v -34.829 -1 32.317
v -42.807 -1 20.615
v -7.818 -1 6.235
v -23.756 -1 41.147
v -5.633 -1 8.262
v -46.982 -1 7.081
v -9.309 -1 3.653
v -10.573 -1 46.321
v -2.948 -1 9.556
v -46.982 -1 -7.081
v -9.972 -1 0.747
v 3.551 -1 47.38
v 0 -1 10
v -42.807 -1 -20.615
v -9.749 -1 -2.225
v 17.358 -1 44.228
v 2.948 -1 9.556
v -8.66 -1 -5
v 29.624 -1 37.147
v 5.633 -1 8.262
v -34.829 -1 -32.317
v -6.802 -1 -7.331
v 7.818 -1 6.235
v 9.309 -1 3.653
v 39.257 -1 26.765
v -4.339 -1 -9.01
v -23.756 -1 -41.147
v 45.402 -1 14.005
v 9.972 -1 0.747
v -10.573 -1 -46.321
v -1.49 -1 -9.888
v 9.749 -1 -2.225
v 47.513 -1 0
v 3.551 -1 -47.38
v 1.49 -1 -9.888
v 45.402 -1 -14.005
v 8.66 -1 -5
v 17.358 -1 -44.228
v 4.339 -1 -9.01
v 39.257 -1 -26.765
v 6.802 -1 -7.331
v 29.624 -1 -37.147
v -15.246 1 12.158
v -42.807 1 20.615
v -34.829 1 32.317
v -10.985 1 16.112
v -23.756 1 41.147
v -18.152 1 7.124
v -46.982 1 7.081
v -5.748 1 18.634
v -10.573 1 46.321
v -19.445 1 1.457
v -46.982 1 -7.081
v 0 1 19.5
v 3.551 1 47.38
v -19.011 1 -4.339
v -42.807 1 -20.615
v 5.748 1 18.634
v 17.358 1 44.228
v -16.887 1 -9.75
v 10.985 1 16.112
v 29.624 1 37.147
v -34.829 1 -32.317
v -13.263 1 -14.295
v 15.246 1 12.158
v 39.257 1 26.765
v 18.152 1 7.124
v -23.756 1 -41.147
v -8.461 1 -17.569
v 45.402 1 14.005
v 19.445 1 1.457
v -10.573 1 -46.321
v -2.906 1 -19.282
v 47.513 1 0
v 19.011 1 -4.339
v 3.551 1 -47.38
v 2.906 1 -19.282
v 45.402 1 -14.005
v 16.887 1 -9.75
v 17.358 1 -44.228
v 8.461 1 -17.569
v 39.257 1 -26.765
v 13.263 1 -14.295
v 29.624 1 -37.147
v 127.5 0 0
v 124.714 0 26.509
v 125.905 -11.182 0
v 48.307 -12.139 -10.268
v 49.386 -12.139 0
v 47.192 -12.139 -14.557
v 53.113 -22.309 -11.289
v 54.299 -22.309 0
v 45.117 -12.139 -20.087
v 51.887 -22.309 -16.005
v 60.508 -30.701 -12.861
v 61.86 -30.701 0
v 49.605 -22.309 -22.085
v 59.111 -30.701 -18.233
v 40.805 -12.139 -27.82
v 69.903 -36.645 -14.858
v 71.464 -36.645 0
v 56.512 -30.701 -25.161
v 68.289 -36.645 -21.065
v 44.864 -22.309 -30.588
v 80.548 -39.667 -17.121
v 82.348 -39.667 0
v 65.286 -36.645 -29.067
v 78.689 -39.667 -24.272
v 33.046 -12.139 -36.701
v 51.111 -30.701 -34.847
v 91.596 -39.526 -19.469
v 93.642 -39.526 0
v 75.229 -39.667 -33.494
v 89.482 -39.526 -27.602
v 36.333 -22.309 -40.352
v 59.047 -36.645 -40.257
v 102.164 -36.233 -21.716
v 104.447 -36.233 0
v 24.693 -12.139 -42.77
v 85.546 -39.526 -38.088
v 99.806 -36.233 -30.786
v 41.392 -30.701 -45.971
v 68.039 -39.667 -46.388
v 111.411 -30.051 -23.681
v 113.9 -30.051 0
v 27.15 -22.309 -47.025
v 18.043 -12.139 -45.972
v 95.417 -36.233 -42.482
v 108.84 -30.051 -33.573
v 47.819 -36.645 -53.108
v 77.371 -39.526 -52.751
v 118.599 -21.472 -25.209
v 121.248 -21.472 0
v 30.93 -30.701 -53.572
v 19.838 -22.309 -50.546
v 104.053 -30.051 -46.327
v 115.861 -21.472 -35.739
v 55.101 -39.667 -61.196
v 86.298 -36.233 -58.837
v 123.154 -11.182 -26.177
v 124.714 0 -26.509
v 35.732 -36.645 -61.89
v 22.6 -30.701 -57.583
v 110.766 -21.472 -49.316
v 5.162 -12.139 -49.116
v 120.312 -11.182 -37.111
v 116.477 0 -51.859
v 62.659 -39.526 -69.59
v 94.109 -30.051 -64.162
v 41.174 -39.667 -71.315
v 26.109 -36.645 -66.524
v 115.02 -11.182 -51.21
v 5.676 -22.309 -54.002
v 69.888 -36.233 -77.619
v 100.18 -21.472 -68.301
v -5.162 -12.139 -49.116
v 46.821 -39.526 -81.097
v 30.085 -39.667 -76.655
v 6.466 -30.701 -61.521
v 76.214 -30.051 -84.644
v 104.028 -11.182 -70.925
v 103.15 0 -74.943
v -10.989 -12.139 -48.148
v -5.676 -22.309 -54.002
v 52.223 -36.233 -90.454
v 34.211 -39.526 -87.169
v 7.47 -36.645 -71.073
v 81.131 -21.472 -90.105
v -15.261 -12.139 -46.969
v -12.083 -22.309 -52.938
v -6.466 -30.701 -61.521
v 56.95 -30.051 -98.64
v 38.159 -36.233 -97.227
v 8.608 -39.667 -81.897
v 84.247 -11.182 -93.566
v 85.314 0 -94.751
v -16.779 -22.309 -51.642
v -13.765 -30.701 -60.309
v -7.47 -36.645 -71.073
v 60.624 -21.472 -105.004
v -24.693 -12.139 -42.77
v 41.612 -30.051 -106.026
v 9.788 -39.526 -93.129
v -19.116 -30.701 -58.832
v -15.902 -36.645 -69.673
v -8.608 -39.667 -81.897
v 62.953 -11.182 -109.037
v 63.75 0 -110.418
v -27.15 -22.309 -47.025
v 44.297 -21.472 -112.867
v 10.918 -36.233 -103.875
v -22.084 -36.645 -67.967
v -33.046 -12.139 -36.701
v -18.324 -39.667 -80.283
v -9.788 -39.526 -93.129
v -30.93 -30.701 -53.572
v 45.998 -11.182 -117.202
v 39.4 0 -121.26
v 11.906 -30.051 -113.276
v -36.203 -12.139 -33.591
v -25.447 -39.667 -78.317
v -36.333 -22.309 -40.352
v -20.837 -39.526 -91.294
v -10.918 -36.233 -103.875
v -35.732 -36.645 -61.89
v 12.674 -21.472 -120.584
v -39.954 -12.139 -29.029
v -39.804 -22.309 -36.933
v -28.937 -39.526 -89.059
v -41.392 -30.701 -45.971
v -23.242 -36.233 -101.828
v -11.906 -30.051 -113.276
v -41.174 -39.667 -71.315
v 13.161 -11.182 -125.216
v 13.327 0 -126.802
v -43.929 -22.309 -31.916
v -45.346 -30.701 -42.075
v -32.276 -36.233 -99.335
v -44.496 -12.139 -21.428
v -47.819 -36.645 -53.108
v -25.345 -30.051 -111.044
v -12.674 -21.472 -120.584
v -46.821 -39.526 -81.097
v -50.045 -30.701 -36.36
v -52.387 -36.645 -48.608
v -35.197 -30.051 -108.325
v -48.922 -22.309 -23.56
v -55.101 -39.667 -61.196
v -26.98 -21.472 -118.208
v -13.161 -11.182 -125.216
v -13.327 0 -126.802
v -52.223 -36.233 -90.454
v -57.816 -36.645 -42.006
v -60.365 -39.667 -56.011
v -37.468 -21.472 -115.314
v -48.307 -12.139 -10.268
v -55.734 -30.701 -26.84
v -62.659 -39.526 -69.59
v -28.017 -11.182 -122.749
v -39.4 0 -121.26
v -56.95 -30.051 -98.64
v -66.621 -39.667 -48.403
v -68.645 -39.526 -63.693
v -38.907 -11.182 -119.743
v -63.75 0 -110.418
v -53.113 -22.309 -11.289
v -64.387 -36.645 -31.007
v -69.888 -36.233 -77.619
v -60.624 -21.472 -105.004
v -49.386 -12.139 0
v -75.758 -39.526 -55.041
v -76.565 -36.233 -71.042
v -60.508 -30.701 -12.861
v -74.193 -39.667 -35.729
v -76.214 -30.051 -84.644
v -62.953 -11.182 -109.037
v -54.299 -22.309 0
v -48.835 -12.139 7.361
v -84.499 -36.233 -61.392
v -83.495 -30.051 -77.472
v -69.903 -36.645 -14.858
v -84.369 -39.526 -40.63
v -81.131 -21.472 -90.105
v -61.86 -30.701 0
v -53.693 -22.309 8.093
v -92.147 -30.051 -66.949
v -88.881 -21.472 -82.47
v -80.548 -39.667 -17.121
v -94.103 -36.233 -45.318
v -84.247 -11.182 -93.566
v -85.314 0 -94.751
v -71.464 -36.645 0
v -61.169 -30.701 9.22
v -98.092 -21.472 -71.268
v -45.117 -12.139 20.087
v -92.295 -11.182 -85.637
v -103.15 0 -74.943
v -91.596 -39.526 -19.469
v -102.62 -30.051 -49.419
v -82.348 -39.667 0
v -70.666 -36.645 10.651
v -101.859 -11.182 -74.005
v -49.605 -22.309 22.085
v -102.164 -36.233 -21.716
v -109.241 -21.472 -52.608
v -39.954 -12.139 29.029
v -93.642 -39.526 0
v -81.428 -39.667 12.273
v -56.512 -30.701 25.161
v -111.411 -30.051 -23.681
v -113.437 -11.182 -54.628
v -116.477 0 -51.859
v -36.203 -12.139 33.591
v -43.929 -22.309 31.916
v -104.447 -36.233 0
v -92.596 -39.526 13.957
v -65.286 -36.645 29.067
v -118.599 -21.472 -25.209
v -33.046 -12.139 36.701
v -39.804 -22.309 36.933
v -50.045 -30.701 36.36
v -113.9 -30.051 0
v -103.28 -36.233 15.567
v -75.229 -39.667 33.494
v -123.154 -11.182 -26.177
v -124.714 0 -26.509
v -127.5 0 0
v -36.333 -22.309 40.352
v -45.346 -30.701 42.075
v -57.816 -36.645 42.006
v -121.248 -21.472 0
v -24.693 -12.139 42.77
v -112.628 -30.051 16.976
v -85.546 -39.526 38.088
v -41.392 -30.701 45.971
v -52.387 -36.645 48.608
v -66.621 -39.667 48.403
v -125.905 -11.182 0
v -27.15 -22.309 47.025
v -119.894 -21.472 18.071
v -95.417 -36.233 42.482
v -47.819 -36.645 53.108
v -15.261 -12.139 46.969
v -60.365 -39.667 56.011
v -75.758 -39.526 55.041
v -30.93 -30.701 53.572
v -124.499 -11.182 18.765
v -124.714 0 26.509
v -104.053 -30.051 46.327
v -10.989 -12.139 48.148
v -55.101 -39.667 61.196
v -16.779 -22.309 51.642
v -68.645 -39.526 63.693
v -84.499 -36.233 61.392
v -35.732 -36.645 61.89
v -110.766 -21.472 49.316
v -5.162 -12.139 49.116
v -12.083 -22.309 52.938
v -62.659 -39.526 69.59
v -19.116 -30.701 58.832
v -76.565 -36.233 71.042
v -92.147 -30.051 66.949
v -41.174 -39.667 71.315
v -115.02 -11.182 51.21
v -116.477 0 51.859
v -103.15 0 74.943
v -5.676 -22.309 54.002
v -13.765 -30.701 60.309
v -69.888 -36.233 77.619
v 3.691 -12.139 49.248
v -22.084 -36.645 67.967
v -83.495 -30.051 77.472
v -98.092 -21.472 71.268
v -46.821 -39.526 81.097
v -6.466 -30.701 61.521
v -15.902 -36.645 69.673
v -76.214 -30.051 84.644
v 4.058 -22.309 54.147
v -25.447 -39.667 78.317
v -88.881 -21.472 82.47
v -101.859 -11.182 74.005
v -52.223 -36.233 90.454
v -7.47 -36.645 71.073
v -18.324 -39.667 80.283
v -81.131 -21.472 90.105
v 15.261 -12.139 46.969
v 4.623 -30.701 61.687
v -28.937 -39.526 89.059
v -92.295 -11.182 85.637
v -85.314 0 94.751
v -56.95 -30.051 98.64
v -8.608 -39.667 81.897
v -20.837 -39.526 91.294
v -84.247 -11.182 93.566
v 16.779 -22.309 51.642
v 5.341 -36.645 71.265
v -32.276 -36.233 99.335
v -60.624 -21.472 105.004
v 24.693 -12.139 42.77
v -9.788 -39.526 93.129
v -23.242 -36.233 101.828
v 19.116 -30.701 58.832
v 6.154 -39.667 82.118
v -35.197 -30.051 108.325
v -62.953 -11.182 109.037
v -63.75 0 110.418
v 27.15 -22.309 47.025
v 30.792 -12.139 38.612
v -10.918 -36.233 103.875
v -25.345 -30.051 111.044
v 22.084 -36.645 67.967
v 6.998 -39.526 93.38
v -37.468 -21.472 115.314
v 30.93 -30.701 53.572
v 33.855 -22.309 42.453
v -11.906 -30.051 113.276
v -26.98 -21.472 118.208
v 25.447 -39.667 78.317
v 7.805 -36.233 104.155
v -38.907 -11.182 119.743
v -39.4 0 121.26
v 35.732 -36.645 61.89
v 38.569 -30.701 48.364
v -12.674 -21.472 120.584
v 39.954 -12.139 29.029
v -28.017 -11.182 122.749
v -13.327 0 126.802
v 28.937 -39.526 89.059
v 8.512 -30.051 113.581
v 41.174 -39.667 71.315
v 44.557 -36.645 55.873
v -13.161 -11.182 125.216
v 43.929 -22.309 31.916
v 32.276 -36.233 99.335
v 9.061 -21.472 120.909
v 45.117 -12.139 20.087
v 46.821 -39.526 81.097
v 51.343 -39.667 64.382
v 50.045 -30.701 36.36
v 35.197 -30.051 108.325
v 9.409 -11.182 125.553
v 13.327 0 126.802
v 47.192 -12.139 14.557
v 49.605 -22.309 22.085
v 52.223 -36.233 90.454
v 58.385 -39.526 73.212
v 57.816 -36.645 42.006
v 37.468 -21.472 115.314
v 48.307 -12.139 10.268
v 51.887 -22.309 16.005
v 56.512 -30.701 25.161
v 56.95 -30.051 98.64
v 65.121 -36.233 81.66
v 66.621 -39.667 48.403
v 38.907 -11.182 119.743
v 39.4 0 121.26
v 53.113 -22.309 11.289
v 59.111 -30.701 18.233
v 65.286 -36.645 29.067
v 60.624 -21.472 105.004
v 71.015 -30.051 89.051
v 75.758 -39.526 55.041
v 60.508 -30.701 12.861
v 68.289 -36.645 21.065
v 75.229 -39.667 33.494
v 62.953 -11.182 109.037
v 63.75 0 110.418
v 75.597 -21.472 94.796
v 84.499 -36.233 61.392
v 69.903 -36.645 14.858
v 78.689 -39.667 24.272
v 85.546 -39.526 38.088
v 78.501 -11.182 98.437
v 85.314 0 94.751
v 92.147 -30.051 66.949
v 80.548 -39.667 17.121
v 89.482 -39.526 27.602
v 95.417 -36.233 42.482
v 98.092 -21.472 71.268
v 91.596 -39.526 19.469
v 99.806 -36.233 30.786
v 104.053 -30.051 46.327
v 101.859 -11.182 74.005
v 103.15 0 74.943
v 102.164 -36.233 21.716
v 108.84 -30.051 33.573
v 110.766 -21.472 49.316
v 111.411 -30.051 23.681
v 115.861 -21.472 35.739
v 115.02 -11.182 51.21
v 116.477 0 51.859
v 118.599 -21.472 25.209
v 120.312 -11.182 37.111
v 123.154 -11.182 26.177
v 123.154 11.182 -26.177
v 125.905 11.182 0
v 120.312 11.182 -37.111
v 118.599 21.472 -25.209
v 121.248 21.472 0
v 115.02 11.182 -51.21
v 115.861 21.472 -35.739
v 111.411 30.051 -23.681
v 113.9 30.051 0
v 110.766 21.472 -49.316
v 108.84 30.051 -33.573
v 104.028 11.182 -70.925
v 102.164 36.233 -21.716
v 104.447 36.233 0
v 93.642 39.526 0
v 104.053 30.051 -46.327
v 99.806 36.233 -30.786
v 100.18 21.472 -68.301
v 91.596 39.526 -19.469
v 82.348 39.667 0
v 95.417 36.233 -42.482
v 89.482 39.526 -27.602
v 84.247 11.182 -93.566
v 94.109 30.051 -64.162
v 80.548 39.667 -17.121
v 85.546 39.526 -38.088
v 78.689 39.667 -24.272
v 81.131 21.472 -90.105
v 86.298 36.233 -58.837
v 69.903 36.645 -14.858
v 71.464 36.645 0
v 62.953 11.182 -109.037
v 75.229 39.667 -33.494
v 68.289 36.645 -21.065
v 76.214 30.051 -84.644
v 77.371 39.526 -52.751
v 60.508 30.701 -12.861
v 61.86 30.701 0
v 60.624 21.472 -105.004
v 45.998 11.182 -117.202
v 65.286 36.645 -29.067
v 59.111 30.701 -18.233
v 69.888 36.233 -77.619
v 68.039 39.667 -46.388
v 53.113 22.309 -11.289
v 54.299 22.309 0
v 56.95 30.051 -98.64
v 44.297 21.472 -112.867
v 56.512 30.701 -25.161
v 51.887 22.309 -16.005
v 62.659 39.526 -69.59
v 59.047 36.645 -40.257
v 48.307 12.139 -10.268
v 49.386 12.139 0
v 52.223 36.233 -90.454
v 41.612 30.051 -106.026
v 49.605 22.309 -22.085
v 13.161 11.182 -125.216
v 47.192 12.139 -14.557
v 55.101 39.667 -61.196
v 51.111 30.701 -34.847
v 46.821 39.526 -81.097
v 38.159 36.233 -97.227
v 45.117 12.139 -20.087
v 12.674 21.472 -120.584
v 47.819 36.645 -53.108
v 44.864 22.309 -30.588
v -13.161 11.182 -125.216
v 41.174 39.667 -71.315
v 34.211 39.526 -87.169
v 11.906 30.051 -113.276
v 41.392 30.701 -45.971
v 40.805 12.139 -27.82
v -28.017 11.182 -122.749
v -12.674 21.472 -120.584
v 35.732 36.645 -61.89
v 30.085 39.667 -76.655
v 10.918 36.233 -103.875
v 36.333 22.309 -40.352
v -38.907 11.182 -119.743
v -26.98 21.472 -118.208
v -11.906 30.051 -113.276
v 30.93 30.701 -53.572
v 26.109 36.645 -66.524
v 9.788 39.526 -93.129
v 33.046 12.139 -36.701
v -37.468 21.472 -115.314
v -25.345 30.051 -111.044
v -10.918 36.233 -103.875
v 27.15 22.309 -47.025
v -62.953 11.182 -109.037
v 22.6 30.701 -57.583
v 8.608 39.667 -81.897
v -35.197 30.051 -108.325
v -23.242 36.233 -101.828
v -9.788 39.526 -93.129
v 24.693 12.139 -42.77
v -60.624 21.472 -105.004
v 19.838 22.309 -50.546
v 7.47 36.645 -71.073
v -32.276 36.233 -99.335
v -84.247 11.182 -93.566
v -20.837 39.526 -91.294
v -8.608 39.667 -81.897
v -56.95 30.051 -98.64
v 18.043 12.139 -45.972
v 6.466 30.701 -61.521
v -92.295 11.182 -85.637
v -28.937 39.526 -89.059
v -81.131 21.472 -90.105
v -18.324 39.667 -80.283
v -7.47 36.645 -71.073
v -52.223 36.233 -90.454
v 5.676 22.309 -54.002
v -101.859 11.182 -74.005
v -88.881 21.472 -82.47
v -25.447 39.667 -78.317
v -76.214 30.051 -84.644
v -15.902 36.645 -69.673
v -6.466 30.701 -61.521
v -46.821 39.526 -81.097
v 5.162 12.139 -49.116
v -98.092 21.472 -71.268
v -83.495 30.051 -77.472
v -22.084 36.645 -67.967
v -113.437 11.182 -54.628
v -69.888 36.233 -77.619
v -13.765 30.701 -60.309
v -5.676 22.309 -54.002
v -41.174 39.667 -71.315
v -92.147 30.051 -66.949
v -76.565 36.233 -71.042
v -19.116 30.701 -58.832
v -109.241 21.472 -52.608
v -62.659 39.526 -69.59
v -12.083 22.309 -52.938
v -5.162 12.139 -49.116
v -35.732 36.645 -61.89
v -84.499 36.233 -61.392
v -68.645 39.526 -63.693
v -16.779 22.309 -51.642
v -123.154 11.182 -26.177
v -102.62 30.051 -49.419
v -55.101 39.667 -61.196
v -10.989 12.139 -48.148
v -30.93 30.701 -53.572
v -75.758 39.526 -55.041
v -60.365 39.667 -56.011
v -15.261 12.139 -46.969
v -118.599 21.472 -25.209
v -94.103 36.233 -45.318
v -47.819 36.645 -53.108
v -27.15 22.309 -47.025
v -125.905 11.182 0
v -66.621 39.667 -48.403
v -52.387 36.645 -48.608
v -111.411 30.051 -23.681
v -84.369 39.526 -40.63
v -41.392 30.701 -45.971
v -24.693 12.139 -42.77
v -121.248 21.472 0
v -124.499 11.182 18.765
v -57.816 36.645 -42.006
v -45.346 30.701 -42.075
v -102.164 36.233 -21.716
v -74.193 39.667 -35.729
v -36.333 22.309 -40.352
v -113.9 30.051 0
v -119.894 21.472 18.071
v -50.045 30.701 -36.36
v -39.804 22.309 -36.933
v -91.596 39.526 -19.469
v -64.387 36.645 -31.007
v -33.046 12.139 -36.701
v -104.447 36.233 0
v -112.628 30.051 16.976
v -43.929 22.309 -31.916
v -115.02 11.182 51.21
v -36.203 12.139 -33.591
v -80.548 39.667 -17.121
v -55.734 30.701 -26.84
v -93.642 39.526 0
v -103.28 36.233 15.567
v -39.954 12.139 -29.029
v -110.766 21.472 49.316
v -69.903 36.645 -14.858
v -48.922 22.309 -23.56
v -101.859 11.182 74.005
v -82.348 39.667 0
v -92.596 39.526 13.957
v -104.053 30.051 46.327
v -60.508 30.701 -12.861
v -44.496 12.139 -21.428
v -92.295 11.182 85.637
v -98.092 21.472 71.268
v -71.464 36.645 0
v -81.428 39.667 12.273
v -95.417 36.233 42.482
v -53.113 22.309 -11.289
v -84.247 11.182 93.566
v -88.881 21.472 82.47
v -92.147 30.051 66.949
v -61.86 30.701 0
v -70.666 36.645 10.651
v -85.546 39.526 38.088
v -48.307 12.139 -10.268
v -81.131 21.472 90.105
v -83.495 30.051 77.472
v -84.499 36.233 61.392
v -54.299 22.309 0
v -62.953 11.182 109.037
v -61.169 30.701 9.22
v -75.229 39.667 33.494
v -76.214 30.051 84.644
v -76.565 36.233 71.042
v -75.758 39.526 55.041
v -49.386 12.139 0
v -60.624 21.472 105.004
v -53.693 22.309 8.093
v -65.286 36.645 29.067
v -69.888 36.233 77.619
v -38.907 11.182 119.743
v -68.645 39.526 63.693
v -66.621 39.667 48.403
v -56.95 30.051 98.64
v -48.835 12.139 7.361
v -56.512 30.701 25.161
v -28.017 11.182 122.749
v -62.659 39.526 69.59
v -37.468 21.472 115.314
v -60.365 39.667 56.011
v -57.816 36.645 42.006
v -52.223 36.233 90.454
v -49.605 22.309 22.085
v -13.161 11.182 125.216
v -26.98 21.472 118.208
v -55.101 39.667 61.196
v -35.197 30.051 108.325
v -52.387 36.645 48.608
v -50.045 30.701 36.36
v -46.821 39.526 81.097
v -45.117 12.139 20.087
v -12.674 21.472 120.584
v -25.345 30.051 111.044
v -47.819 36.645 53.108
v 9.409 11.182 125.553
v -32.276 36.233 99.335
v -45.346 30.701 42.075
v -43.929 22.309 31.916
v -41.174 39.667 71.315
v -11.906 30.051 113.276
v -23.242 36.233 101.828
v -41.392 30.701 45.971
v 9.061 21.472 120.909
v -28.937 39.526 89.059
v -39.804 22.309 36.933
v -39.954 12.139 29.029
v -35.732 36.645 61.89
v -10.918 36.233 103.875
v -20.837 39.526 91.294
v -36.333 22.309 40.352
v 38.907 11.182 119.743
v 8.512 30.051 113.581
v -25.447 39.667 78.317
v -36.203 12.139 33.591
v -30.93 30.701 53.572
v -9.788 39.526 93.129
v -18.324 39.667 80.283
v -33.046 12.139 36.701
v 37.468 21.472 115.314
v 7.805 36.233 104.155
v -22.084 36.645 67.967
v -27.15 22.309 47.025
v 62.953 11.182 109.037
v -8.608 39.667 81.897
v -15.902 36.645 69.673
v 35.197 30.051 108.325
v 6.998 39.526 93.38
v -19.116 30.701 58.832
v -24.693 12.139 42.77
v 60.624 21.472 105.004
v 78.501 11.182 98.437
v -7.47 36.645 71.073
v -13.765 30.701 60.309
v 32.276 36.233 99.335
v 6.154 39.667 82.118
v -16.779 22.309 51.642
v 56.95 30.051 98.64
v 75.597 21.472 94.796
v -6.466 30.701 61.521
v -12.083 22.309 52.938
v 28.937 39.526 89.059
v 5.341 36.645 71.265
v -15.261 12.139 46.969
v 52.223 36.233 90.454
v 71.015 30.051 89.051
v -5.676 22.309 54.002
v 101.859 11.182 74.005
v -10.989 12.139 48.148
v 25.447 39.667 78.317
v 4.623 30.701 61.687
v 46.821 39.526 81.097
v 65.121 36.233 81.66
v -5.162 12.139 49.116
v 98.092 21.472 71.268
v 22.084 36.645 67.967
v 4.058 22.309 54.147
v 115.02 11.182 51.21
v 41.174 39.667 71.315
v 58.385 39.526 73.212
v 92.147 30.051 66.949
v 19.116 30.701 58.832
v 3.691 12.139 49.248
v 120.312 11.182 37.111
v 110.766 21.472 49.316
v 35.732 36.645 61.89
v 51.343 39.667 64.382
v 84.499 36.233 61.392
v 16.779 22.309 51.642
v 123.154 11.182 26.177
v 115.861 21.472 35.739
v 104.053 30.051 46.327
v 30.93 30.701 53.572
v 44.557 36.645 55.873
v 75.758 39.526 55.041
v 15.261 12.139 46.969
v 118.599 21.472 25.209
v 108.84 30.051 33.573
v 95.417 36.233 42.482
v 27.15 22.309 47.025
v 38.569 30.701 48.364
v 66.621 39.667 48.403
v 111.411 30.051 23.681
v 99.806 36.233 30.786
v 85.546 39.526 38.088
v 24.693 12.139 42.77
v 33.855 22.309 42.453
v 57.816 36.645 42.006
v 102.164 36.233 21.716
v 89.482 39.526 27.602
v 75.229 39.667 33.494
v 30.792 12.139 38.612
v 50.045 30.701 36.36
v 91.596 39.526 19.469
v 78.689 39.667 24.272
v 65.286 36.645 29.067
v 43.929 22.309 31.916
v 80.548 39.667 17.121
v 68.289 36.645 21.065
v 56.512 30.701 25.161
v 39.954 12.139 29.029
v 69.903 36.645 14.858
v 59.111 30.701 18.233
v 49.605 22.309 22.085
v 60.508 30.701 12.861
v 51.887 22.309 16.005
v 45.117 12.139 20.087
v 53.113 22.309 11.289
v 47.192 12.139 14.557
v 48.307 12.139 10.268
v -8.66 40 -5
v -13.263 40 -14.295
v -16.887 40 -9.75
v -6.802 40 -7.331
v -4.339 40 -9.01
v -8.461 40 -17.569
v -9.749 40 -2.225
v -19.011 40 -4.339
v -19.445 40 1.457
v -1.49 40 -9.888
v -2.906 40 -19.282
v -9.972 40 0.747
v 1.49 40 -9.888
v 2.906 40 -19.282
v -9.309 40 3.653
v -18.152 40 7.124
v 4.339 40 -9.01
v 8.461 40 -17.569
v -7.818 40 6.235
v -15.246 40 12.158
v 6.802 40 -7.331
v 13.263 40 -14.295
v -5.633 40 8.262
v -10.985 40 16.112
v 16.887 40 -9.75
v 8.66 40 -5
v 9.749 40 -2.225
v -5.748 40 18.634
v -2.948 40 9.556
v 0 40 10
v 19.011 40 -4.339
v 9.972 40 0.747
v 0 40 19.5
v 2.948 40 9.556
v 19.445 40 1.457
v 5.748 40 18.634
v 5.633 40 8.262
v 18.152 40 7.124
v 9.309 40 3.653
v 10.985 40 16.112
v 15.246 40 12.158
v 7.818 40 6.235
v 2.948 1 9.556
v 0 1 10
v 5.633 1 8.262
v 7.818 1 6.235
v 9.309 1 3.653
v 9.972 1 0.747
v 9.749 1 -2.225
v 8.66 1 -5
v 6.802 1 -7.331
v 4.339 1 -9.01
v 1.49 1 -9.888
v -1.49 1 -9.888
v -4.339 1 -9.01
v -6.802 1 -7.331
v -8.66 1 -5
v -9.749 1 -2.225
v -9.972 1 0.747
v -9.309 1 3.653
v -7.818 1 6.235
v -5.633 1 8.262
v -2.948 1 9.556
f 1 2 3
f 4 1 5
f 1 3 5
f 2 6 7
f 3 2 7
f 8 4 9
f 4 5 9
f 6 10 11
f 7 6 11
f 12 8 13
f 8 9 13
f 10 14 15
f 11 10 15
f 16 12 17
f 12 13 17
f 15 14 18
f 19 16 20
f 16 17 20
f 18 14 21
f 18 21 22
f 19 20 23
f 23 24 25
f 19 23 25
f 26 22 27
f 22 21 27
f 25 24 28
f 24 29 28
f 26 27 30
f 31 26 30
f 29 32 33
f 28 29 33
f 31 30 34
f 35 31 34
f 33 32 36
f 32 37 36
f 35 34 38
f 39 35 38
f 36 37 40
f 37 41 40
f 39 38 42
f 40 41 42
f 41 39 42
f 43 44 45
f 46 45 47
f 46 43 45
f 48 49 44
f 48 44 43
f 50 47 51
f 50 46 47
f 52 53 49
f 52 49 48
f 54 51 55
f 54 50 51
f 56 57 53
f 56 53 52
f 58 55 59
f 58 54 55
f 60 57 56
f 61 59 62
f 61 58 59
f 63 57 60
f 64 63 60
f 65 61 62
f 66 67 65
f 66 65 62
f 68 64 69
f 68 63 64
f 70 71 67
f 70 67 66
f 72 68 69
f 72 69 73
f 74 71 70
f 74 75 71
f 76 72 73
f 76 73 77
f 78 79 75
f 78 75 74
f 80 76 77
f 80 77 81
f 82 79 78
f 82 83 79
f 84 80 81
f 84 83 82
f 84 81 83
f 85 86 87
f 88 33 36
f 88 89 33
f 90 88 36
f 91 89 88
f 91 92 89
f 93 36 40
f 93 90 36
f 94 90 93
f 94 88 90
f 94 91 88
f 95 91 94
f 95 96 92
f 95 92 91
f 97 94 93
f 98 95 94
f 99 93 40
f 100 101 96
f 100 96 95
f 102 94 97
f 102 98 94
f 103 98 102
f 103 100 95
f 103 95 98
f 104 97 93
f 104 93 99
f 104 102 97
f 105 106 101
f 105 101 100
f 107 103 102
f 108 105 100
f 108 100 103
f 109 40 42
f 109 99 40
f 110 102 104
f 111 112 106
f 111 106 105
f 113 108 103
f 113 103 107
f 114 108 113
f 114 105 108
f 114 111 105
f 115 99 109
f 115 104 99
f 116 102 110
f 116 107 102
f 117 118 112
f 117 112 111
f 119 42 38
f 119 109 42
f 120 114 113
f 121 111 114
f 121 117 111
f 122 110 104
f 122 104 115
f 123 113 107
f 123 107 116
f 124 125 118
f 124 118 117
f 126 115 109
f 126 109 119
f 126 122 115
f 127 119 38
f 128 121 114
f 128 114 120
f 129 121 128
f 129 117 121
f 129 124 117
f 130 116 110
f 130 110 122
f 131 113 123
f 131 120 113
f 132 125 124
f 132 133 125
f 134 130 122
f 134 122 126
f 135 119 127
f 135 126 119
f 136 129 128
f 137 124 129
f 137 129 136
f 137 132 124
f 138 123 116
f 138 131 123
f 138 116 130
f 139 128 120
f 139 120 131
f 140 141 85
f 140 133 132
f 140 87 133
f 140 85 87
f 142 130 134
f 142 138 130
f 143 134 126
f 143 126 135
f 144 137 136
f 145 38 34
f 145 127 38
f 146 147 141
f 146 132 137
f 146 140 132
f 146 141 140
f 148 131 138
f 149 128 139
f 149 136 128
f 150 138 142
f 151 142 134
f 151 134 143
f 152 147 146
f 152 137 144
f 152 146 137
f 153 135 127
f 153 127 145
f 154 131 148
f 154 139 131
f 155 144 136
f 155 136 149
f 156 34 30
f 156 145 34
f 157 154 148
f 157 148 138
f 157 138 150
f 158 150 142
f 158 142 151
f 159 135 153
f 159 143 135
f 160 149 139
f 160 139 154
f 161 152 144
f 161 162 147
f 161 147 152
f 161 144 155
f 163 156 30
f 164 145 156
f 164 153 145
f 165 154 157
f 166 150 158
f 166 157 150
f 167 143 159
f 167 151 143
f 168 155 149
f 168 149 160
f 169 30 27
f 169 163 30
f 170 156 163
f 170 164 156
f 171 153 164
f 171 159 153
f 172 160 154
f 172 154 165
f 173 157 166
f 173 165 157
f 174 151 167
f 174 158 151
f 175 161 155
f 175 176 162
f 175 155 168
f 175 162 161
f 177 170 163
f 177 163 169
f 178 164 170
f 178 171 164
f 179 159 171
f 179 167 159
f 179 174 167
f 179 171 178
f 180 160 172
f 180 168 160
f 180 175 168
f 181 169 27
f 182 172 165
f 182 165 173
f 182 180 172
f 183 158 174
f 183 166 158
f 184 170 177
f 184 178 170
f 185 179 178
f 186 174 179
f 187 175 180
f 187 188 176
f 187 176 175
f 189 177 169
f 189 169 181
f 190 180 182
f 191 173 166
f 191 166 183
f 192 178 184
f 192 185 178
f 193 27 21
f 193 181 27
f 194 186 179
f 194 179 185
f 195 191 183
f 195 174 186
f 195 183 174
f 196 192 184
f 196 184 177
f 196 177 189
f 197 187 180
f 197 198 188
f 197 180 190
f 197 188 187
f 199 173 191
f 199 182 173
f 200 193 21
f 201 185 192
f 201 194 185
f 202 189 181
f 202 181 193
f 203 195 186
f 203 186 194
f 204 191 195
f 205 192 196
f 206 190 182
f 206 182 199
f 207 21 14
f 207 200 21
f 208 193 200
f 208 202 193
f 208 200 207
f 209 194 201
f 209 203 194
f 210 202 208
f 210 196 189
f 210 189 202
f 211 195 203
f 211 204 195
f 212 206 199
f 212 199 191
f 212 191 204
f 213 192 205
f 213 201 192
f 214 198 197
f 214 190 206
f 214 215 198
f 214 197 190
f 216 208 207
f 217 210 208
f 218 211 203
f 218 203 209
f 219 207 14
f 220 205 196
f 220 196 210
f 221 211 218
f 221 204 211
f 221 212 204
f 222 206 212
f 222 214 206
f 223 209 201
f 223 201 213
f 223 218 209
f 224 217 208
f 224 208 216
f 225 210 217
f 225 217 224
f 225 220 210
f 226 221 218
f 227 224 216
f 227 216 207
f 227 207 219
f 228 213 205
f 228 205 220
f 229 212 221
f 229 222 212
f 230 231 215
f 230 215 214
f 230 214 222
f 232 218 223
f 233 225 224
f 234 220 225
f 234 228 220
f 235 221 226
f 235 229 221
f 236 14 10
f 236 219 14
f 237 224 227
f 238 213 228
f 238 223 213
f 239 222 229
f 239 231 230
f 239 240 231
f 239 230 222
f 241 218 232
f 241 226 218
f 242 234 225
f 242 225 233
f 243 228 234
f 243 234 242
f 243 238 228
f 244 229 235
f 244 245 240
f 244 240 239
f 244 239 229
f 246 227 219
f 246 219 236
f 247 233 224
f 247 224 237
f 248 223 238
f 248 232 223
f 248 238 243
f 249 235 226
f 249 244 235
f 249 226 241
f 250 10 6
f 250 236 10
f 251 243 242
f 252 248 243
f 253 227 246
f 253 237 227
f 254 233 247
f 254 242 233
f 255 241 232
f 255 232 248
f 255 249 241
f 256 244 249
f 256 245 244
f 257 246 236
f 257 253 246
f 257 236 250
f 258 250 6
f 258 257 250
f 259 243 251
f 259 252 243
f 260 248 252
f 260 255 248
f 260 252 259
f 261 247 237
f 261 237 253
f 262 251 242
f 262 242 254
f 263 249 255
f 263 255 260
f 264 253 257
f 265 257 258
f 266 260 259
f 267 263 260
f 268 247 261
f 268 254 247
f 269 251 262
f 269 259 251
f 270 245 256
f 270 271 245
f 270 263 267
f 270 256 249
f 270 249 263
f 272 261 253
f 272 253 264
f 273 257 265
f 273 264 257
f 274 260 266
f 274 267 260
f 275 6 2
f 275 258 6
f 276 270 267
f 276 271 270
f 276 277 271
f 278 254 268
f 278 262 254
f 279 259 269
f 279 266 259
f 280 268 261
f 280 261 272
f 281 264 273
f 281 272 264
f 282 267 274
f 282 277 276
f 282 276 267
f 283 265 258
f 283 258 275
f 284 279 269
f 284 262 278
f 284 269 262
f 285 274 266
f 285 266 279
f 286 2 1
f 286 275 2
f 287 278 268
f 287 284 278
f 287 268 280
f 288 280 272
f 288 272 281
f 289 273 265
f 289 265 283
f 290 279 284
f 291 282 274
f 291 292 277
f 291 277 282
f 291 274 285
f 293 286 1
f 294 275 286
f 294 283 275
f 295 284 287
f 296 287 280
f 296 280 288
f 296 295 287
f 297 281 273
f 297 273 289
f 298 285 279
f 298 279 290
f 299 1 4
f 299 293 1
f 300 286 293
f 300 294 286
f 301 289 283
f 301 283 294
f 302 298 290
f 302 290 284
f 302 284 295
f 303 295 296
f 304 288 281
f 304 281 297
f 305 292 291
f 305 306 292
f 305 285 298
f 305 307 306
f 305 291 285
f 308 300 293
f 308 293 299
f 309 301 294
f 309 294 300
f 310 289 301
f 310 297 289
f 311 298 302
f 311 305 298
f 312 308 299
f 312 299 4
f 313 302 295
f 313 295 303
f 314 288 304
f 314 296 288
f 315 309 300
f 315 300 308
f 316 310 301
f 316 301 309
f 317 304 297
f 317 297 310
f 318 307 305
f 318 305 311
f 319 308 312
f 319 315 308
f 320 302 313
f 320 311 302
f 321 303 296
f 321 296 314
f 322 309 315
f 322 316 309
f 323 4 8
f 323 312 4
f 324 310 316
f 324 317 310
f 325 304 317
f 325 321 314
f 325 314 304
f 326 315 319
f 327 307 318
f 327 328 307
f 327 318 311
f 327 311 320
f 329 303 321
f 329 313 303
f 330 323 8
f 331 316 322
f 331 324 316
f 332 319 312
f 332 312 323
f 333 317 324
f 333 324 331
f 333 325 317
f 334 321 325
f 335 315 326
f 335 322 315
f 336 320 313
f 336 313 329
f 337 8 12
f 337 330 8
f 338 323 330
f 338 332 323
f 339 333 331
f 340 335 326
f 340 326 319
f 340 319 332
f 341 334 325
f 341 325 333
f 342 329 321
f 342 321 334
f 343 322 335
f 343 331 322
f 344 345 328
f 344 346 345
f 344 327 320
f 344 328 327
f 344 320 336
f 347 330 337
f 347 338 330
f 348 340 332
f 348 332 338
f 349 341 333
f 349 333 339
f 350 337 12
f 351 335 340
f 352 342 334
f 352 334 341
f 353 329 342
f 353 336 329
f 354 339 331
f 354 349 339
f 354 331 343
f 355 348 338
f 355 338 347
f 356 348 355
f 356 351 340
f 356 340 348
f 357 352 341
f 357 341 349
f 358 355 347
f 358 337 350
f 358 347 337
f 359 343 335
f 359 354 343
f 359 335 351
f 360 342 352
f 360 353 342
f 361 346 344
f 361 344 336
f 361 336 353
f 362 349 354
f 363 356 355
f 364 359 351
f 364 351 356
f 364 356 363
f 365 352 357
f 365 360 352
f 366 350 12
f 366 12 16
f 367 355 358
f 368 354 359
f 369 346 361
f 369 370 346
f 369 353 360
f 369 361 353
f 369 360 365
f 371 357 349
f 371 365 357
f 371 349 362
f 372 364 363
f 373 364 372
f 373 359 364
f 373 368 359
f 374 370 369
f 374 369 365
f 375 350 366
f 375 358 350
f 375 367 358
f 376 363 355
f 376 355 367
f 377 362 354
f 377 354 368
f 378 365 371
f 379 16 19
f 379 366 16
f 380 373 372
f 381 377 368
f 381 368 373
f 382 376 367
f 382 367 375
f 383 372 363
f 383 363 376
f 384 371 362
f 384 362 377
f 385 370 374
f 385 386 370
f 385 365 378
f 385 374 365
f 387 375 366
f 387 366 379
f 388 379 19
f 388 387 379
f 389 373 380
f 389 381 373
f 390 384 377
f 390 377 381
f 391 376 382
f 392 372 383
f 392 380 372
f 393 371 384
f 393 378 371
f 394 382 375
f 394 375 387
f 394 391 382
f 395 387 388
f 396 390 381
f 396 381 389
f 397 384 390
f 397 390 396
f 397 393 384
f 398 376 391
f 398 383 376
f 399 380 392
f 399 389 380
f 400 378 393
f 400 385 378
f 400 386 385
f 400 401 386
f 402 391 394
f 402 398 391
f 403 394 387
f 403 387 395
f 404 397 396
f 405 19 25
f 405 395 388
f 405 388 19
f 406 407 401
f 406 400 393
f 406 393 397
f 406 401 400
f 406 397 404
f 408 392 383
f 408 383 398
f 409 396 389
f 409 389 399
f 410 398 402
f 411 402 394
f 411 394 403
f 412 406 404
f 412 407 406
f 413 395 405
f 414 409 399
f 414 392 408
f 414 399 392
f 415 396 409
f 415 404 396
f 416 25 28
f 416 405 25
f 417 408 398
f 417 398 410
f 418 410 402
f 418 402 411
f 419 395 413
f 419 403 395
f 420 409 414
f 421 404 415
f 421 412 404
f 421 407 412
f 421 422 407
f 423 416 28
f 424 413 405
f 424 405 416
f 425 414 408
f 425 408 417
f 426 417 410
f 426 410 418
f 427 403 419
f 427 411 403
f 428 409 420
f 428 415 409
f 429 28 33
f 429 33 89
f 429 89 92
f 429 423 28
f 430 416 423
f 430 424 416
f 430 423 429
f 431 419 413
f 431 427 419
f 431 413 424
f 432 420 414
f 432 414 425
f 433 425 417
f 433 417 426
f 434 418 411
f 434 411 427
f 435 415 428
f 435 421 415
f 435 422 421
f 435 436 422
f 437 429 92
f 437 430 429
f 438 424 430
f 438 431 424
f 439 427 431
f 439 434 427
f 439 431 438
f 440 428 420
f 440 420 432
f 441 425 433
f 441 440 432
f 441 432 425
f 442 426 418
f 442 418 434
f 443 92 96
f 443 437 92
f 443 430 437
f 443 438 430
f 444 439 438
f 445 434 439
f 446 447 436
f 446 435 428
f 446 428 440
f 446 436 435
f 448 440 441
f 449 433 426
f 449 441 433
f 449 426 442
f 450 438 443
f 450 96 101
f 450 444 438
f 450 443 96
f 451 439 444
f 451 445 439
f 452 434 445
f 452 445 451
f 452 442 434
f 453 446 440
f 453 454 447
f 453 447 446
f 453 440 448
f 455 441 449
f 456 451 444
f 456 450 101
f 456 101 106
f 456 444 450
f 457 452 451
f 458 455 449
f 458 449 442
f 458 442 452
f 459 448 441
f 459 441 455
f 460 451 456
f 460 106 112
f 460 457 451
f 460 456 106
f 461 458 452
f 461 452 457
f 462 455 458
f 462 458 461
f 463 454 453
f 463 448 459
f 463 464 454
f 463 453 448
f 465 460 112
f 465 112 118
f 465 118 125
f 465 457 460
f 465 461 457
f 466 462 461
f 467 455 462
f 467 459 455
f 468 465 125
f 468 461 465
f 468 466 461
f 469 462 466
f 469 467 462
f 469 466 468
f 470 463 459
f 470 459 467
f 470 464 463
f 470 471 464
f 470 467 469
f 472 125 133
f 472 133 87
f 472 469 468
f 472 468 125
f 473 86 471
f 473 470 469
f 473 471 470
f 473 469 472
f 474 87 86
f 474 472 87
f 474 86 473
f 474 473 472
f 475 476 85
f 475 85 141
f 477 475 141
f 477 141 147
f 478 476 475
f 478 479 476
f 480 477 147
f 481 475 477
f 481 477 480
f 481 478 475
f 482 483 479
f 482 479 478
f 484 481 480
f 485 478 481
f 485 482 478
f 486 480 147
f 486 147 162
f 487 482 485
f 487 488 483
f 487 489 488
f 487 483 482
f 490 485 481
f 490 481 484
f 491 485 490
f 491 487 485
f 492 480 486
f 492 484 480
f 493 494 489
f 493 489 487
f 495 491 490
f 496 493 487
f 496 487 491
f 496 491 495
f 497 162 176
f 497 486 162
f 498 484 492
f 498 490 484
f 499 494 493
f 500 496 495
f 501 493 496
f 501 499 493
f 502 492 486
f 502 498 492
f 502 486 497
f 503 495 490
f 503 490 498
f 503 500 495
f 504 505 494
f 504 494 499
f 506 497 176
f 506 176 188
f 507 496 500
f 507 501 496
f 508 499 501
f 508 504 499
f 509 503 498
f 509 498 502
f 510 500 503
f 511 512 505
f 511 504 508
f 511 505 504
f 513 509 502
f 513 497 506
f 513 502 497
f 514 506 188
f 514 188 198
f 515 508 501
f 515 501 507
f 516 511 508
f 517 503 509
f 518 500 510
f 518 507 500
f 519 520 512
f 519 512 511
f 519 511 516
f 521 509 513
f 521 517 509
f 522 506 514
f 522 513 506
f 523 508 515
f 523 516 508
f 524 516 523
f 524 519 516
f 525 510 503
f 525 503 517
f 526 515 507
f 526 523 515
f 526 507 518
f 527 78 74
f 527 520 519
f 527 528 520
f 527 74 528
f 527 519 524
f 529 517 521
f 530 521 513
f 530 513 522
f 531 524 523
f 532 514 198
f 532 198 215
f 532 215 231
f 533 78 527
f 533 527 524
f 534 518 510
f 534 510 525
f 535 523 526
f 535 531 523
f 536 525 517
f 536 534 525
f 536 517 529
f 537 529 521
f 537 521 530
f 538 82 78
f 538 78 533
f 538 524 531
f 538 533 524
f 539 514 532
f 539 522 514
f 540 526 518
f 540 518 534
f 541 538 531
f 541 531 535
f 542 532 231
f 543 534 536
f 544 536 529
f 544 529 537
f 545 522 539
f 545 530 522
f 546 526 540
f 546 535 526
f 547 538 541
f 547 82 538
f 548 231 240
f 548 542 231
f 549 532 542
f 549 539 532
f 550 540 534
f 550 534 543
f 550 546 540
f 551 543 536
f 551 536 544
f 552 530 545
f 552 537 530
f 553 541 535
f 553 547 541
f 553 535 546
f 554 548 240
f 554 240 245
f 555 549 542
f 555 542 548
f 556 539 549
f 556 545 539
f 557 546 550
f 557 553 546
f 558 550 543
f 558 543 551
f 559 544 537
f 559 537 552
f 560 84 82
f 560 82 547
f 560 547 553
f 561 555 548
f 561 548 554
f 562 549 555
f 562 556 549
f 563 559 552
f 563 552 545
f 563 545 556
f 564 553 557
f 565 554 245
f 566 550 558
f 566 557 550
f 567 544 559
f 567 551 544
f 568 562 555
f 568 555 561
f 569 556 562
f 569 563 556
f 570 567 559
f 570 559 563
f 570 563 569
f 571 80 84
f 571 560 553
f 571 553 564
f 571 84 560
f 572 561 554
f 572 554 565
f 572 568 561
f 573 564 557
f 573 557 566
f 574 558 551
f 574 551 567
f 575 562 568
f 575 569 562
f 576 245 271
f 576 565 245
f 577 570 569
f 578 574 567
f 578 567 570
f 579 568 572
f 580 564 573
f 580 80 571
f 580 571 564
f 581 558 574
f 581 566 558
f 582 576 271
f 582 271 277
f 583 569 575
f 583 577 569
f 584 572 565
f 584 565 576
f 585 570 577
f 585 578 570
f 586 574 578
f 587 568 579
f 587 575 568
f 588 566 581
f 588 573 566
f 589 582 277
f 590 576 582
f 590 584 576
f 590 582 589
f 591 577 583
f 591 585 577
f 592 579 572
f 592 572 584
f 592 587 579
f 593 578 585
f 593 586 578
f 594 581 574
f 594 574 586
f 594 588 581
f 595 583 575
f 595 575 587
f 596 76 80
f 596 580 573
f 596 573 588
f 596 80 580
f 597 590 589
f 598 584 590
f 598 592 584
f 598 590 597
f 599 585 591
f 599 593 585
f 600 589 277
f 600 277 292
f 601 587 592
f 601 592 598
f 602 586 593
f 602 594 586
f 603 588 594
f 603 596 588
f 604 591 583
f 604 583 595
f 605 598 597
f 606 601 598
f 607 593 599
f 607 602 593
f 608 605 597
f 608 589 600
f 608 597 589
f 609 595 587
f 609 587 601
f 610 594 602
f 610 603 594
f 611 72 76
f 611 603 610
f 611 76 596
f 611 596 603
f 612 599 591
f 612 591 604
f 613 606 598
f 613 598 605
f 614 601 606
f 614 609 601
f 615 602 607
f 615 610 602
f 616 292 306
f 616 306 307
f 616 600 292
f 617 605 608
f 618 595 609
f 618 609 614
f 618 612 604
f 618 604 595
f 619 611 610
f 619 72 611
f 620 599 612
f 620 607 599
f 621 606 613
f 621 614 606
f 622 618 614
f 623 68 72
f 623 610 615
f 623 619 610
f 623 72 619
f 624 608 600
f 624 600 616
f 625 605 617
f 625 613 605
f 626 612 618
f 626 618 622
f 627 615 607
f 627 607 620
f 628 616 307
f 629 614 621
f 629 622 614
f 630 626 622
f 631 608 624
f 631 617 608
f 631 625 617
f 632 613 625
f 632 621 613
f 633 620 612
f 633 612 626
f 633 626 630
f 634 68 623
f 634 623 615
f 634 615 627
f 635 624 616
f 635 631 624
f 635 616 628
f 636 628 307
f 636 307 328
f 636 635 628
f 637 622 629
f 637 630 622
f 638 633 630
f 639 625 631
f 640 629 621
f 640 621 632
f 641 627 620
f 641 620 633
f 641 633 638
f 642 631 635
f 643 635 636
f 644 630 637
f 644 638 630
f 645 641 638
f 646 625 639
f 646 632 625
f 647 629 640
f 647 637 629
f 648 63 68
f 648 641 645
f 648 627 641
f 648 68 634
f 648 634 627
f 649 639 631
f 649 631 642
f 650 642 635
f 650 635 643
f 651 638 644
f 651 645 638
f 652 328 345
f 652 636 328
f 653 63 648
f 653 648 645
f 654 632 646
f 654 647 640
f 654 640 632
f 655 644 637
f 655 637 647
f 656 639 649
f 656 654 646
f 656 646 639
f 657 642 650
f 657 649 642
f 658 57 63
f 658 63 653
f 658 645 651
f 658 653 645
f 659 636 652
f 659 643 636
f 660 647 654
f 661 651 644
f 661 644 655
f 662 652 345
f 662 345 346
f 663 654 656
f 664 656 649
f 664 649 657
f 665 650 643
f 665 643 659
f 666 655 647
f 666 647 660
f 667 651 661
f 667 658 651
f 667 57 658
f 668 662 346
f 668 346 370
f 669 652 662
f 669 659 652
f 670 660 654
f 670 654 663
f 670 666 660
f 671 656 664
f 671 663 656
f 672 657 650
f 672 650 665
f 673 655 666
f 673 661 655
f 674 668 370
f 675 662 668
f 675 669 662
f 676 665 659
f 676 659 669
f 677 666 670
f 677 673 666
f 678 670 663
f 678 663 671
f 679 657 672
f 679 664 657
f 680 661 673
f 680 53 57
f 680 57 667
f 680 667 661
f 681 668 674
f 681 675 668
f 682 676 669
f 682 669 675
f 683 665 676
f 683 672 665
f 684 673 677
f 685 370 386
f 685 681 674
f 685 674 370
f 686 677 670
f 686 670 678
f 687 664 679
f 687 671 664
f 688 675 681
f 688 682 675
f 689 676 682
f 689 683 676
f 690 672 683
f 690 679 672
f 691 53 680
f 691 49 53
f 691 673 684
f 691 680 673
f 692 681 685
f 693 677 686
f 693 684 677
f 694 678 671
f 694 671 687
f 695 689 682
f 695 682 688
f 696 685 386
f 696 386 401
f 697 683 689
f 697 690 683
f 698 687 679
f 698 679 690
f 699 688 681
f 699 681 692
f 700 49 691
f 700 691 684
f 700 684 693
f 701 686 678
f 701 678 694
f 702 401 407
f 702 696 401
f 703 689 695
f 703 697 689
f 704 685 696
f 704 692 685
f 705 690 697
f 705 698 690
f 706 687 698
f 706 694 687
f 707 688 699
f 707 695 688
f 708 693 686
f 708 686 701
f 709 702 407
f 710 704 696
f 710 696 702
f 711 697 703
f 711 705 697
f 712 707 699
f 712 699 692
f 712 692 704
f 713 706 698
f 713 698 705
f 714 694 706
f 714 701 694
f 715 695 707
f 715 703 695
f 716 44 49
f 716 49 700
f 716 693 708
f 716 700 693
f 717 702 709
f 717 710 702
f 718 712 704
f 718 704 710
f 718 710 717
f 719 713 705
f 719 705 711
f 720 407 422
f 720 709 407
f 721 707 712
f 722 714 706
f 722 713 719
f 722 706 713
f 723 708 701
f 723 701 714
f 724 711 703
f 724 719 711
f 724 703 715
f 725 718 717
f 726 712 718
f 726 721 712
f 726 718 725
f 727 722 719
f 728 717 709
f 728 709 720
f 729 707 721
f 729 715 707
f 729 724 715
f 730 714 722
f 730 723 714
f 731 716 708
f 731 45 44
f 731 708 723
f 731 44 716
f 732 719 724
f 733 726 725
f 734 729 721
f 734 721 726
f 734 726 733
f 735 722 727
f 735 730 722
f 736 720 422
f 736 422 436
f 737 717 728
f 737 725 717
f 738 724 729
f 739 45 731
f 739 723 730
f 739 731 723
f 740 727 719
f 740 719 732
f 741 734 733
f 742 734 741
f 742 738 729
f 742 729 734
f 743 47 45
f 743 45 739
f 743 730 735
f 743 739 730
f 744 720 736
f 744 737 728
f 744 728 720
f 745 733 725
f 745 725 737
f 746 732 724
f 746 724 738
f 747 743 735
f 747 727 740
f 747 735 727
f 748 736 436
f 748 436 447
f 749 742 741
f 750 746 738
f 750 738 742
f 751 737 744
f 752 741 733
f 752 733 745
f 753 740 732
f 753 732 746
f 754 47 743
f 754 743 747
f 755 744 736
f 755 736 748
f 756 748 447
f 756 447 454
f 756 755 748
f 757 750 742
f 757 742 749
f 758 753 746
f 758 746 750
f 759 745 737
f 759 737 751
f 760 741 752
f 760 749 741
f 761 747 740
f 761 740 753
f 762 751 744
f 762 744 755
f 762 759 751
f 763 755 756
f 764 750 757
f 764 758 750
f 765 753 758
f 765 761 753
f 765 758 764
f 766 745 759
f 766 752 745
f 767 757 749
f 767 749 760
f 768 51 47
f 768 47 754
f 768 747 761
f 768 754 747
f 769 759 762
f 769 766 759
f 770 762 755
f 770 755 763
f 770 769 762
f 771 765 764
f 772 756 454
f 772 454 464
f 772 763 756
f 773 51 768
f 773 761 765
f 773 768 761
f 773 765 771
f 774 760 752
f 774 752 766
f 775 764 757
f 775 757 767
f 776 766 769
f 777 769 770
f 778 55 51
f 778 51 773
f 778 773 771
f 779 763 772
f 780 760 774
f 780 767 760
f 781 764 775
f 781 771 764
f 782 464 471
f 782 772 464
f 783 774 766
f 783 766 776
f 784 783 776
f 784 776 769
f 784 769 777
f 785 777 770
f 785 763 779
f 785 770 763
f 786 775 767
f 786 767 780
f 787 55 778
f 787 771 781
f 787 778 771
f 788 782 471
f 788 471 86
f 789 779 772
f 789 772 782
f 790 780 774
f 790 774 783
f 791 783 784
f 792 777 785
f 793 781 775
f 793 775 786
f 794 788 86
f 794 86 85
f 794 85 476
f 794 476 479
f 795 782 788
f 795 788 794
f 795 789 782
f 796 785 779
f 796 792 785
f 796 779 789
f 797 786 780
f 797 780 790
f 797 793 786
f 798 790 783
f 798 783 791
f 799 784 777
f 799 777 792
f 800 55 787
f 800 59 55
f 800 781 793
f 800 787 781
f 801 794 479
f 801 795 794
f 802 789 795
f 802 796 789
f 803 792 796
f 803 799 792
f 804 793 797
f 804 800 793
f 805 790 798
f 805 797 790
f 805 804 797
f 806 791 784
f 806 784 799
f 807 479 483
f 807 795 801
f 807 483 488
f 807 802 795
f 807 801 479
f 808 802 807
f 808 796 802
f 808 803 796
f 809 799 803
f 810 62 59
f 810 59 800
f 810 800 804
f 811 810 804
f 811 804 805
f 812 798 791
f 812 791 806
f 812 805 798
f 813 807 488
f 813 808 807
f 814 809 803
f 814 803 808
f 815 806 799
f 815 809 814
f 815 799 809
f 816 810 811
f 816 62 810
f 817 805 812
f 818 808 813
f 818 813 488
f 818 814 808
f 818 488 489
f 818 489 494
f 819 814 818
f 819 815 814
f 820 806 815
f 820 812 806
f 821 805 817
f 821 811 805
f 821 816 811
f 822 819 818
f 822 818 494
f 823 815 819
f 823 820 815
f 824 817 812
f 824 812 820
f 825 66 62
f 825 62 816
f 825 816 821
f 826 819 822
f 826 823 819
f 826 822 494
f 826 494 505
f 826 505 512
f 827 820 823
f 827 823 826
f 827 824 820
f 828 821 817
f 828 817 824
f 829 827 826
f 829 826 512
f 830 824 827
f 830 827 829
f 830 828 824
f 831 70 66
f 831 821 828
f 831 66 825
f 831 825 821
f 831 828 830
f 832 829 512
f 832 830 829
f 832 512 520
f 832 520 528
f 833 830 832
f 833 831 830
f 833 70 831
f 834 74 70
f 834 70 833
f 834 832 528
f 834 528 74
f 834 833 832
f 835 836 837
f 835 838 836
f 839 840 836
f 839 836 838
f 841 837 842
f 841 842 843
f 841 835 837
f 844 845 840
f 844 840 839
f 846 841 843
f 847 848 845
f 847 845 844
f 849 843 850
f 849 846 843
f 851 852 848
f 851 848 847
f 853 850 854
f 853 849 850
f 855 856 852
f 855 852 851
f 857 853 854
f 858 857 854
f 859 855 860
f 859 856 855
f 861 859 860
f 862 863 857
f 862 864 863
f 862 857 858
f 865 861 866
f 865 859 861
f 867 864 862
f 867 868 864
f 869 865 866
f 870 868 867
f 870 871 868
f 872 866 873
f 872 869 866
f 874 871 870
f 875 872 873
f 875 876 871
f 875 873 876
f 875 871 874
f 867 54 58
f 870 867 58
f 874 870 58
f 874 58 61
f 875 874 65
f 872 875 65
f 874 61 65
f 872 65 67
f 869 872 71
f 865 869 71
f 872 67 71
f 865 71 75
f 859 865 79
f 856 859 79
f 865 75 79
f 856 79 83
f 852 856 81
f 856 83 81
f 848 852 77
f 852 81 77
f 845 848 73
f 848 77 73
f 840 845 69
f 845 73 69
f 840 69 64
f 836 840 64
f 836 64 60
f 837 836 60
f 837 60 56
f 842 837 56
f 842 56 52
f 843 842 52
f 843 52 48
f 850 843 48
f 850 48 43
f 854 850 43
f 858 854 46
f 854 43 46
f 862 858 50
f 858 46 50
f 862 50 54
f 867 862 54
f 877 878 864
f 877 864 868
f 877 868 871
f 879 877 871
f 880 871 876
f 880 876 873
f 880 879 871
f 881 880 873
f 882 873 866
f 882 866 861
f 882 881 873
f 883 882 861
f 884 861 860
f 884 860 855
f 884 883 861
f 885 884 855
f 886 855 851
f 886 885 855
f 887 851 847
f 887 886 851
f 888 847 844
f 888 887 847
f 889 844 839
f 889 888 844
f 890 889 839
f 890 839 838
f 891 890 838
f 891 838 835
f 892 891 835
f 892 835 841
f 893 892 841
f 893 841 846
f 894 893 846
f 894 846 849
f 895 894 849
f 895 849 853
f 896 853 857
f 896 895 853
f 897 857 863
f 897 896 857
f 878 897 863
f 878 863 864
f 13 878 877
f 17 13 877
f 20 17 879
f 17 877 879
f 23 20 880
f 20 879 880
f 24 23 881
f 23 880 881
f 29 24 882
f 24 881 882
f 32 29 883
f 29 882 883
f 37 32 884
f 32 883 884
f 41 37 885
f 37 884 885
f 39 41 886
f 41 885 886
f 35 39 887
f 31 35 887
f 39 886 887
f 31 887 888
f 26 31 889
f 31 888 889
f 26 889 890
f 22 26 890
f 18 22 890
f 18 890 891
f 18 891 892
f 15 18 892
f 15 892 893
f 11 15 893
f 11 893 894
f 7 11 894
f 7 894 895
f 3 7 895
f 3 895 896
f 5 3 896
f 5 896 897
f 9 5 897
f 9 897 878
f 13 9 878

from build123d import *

# Parameters (mm, degrees)
SKETCH1_R           = 40
SKETCH3_R           = 82.354581533
BOSS_EXTRUDE1_DEPTH = 1
SKETCH4_R           = 19.5
SKETCH4_R_2         = 10
BOSS_EXTRUDE2_DEPTH = 39
SKETCH5_R           = 10
CUT_EXTRUDE1_DEPTH  = 42.0000001


with BuildPart() as part:
    # Sketch1 → Revolve1 (revolve)
    with BuildSketch(Plane.XY):
        with Locations((87.5, 0)):
            Circle(SKETCH1_R)
    revolve(axis=Axis((0, -1000, 0), (0, 1, 0)))

    # Sketch3 → Boss-Extrude1 (add, symmetric)
    with BuildSketch(Plane(origin=(0, 0, 0), x_dir=(1, 0, 0), z_dir=(0, 1, 0))):
        Circle(SKETCH3_R)
    extrude(amount=BOSS_EXTRUDE1_DEPTH, both=True)

    # Sketch4 → Boss-Extrude2 (add)
    with BuildSketch(Plane(origin=(0, 1, 0), x_dir=(1, 0, 0), z_dir=(0, 1, 0))):
        with Locations(Location((0, 0, 0), (0, 0, 270))):  # turned: the seam where the file's is
            Circle(SKETCH4_R)
        with Locations(Location((0, 0, 0), (0, 0, 270))):  # turned: the seam where the file's is
            Circle(SKETCH4_R_2, mode=Mode.SUBTRACT)
    extrude(amount=BOSS_EXTRUDE2_DEPTH)

    # Sketch5 → Cut-Extrude1 (cut, through all)
    with BuildSketch(Plane(origin=(0, 1, 0), x_dir=(1, 0, 0), z_dir=(0, 1, 0))):
        with Locations(Location((0, 0, 0), (0, 0, 270))):  # turned: the seam where the file's is
            Circle(SKETCH5_R)
    extrude(amount=-CUT_EXTRUDE1_DEPTH, mode=Mode.SUBTRACT)


solid = part.part
